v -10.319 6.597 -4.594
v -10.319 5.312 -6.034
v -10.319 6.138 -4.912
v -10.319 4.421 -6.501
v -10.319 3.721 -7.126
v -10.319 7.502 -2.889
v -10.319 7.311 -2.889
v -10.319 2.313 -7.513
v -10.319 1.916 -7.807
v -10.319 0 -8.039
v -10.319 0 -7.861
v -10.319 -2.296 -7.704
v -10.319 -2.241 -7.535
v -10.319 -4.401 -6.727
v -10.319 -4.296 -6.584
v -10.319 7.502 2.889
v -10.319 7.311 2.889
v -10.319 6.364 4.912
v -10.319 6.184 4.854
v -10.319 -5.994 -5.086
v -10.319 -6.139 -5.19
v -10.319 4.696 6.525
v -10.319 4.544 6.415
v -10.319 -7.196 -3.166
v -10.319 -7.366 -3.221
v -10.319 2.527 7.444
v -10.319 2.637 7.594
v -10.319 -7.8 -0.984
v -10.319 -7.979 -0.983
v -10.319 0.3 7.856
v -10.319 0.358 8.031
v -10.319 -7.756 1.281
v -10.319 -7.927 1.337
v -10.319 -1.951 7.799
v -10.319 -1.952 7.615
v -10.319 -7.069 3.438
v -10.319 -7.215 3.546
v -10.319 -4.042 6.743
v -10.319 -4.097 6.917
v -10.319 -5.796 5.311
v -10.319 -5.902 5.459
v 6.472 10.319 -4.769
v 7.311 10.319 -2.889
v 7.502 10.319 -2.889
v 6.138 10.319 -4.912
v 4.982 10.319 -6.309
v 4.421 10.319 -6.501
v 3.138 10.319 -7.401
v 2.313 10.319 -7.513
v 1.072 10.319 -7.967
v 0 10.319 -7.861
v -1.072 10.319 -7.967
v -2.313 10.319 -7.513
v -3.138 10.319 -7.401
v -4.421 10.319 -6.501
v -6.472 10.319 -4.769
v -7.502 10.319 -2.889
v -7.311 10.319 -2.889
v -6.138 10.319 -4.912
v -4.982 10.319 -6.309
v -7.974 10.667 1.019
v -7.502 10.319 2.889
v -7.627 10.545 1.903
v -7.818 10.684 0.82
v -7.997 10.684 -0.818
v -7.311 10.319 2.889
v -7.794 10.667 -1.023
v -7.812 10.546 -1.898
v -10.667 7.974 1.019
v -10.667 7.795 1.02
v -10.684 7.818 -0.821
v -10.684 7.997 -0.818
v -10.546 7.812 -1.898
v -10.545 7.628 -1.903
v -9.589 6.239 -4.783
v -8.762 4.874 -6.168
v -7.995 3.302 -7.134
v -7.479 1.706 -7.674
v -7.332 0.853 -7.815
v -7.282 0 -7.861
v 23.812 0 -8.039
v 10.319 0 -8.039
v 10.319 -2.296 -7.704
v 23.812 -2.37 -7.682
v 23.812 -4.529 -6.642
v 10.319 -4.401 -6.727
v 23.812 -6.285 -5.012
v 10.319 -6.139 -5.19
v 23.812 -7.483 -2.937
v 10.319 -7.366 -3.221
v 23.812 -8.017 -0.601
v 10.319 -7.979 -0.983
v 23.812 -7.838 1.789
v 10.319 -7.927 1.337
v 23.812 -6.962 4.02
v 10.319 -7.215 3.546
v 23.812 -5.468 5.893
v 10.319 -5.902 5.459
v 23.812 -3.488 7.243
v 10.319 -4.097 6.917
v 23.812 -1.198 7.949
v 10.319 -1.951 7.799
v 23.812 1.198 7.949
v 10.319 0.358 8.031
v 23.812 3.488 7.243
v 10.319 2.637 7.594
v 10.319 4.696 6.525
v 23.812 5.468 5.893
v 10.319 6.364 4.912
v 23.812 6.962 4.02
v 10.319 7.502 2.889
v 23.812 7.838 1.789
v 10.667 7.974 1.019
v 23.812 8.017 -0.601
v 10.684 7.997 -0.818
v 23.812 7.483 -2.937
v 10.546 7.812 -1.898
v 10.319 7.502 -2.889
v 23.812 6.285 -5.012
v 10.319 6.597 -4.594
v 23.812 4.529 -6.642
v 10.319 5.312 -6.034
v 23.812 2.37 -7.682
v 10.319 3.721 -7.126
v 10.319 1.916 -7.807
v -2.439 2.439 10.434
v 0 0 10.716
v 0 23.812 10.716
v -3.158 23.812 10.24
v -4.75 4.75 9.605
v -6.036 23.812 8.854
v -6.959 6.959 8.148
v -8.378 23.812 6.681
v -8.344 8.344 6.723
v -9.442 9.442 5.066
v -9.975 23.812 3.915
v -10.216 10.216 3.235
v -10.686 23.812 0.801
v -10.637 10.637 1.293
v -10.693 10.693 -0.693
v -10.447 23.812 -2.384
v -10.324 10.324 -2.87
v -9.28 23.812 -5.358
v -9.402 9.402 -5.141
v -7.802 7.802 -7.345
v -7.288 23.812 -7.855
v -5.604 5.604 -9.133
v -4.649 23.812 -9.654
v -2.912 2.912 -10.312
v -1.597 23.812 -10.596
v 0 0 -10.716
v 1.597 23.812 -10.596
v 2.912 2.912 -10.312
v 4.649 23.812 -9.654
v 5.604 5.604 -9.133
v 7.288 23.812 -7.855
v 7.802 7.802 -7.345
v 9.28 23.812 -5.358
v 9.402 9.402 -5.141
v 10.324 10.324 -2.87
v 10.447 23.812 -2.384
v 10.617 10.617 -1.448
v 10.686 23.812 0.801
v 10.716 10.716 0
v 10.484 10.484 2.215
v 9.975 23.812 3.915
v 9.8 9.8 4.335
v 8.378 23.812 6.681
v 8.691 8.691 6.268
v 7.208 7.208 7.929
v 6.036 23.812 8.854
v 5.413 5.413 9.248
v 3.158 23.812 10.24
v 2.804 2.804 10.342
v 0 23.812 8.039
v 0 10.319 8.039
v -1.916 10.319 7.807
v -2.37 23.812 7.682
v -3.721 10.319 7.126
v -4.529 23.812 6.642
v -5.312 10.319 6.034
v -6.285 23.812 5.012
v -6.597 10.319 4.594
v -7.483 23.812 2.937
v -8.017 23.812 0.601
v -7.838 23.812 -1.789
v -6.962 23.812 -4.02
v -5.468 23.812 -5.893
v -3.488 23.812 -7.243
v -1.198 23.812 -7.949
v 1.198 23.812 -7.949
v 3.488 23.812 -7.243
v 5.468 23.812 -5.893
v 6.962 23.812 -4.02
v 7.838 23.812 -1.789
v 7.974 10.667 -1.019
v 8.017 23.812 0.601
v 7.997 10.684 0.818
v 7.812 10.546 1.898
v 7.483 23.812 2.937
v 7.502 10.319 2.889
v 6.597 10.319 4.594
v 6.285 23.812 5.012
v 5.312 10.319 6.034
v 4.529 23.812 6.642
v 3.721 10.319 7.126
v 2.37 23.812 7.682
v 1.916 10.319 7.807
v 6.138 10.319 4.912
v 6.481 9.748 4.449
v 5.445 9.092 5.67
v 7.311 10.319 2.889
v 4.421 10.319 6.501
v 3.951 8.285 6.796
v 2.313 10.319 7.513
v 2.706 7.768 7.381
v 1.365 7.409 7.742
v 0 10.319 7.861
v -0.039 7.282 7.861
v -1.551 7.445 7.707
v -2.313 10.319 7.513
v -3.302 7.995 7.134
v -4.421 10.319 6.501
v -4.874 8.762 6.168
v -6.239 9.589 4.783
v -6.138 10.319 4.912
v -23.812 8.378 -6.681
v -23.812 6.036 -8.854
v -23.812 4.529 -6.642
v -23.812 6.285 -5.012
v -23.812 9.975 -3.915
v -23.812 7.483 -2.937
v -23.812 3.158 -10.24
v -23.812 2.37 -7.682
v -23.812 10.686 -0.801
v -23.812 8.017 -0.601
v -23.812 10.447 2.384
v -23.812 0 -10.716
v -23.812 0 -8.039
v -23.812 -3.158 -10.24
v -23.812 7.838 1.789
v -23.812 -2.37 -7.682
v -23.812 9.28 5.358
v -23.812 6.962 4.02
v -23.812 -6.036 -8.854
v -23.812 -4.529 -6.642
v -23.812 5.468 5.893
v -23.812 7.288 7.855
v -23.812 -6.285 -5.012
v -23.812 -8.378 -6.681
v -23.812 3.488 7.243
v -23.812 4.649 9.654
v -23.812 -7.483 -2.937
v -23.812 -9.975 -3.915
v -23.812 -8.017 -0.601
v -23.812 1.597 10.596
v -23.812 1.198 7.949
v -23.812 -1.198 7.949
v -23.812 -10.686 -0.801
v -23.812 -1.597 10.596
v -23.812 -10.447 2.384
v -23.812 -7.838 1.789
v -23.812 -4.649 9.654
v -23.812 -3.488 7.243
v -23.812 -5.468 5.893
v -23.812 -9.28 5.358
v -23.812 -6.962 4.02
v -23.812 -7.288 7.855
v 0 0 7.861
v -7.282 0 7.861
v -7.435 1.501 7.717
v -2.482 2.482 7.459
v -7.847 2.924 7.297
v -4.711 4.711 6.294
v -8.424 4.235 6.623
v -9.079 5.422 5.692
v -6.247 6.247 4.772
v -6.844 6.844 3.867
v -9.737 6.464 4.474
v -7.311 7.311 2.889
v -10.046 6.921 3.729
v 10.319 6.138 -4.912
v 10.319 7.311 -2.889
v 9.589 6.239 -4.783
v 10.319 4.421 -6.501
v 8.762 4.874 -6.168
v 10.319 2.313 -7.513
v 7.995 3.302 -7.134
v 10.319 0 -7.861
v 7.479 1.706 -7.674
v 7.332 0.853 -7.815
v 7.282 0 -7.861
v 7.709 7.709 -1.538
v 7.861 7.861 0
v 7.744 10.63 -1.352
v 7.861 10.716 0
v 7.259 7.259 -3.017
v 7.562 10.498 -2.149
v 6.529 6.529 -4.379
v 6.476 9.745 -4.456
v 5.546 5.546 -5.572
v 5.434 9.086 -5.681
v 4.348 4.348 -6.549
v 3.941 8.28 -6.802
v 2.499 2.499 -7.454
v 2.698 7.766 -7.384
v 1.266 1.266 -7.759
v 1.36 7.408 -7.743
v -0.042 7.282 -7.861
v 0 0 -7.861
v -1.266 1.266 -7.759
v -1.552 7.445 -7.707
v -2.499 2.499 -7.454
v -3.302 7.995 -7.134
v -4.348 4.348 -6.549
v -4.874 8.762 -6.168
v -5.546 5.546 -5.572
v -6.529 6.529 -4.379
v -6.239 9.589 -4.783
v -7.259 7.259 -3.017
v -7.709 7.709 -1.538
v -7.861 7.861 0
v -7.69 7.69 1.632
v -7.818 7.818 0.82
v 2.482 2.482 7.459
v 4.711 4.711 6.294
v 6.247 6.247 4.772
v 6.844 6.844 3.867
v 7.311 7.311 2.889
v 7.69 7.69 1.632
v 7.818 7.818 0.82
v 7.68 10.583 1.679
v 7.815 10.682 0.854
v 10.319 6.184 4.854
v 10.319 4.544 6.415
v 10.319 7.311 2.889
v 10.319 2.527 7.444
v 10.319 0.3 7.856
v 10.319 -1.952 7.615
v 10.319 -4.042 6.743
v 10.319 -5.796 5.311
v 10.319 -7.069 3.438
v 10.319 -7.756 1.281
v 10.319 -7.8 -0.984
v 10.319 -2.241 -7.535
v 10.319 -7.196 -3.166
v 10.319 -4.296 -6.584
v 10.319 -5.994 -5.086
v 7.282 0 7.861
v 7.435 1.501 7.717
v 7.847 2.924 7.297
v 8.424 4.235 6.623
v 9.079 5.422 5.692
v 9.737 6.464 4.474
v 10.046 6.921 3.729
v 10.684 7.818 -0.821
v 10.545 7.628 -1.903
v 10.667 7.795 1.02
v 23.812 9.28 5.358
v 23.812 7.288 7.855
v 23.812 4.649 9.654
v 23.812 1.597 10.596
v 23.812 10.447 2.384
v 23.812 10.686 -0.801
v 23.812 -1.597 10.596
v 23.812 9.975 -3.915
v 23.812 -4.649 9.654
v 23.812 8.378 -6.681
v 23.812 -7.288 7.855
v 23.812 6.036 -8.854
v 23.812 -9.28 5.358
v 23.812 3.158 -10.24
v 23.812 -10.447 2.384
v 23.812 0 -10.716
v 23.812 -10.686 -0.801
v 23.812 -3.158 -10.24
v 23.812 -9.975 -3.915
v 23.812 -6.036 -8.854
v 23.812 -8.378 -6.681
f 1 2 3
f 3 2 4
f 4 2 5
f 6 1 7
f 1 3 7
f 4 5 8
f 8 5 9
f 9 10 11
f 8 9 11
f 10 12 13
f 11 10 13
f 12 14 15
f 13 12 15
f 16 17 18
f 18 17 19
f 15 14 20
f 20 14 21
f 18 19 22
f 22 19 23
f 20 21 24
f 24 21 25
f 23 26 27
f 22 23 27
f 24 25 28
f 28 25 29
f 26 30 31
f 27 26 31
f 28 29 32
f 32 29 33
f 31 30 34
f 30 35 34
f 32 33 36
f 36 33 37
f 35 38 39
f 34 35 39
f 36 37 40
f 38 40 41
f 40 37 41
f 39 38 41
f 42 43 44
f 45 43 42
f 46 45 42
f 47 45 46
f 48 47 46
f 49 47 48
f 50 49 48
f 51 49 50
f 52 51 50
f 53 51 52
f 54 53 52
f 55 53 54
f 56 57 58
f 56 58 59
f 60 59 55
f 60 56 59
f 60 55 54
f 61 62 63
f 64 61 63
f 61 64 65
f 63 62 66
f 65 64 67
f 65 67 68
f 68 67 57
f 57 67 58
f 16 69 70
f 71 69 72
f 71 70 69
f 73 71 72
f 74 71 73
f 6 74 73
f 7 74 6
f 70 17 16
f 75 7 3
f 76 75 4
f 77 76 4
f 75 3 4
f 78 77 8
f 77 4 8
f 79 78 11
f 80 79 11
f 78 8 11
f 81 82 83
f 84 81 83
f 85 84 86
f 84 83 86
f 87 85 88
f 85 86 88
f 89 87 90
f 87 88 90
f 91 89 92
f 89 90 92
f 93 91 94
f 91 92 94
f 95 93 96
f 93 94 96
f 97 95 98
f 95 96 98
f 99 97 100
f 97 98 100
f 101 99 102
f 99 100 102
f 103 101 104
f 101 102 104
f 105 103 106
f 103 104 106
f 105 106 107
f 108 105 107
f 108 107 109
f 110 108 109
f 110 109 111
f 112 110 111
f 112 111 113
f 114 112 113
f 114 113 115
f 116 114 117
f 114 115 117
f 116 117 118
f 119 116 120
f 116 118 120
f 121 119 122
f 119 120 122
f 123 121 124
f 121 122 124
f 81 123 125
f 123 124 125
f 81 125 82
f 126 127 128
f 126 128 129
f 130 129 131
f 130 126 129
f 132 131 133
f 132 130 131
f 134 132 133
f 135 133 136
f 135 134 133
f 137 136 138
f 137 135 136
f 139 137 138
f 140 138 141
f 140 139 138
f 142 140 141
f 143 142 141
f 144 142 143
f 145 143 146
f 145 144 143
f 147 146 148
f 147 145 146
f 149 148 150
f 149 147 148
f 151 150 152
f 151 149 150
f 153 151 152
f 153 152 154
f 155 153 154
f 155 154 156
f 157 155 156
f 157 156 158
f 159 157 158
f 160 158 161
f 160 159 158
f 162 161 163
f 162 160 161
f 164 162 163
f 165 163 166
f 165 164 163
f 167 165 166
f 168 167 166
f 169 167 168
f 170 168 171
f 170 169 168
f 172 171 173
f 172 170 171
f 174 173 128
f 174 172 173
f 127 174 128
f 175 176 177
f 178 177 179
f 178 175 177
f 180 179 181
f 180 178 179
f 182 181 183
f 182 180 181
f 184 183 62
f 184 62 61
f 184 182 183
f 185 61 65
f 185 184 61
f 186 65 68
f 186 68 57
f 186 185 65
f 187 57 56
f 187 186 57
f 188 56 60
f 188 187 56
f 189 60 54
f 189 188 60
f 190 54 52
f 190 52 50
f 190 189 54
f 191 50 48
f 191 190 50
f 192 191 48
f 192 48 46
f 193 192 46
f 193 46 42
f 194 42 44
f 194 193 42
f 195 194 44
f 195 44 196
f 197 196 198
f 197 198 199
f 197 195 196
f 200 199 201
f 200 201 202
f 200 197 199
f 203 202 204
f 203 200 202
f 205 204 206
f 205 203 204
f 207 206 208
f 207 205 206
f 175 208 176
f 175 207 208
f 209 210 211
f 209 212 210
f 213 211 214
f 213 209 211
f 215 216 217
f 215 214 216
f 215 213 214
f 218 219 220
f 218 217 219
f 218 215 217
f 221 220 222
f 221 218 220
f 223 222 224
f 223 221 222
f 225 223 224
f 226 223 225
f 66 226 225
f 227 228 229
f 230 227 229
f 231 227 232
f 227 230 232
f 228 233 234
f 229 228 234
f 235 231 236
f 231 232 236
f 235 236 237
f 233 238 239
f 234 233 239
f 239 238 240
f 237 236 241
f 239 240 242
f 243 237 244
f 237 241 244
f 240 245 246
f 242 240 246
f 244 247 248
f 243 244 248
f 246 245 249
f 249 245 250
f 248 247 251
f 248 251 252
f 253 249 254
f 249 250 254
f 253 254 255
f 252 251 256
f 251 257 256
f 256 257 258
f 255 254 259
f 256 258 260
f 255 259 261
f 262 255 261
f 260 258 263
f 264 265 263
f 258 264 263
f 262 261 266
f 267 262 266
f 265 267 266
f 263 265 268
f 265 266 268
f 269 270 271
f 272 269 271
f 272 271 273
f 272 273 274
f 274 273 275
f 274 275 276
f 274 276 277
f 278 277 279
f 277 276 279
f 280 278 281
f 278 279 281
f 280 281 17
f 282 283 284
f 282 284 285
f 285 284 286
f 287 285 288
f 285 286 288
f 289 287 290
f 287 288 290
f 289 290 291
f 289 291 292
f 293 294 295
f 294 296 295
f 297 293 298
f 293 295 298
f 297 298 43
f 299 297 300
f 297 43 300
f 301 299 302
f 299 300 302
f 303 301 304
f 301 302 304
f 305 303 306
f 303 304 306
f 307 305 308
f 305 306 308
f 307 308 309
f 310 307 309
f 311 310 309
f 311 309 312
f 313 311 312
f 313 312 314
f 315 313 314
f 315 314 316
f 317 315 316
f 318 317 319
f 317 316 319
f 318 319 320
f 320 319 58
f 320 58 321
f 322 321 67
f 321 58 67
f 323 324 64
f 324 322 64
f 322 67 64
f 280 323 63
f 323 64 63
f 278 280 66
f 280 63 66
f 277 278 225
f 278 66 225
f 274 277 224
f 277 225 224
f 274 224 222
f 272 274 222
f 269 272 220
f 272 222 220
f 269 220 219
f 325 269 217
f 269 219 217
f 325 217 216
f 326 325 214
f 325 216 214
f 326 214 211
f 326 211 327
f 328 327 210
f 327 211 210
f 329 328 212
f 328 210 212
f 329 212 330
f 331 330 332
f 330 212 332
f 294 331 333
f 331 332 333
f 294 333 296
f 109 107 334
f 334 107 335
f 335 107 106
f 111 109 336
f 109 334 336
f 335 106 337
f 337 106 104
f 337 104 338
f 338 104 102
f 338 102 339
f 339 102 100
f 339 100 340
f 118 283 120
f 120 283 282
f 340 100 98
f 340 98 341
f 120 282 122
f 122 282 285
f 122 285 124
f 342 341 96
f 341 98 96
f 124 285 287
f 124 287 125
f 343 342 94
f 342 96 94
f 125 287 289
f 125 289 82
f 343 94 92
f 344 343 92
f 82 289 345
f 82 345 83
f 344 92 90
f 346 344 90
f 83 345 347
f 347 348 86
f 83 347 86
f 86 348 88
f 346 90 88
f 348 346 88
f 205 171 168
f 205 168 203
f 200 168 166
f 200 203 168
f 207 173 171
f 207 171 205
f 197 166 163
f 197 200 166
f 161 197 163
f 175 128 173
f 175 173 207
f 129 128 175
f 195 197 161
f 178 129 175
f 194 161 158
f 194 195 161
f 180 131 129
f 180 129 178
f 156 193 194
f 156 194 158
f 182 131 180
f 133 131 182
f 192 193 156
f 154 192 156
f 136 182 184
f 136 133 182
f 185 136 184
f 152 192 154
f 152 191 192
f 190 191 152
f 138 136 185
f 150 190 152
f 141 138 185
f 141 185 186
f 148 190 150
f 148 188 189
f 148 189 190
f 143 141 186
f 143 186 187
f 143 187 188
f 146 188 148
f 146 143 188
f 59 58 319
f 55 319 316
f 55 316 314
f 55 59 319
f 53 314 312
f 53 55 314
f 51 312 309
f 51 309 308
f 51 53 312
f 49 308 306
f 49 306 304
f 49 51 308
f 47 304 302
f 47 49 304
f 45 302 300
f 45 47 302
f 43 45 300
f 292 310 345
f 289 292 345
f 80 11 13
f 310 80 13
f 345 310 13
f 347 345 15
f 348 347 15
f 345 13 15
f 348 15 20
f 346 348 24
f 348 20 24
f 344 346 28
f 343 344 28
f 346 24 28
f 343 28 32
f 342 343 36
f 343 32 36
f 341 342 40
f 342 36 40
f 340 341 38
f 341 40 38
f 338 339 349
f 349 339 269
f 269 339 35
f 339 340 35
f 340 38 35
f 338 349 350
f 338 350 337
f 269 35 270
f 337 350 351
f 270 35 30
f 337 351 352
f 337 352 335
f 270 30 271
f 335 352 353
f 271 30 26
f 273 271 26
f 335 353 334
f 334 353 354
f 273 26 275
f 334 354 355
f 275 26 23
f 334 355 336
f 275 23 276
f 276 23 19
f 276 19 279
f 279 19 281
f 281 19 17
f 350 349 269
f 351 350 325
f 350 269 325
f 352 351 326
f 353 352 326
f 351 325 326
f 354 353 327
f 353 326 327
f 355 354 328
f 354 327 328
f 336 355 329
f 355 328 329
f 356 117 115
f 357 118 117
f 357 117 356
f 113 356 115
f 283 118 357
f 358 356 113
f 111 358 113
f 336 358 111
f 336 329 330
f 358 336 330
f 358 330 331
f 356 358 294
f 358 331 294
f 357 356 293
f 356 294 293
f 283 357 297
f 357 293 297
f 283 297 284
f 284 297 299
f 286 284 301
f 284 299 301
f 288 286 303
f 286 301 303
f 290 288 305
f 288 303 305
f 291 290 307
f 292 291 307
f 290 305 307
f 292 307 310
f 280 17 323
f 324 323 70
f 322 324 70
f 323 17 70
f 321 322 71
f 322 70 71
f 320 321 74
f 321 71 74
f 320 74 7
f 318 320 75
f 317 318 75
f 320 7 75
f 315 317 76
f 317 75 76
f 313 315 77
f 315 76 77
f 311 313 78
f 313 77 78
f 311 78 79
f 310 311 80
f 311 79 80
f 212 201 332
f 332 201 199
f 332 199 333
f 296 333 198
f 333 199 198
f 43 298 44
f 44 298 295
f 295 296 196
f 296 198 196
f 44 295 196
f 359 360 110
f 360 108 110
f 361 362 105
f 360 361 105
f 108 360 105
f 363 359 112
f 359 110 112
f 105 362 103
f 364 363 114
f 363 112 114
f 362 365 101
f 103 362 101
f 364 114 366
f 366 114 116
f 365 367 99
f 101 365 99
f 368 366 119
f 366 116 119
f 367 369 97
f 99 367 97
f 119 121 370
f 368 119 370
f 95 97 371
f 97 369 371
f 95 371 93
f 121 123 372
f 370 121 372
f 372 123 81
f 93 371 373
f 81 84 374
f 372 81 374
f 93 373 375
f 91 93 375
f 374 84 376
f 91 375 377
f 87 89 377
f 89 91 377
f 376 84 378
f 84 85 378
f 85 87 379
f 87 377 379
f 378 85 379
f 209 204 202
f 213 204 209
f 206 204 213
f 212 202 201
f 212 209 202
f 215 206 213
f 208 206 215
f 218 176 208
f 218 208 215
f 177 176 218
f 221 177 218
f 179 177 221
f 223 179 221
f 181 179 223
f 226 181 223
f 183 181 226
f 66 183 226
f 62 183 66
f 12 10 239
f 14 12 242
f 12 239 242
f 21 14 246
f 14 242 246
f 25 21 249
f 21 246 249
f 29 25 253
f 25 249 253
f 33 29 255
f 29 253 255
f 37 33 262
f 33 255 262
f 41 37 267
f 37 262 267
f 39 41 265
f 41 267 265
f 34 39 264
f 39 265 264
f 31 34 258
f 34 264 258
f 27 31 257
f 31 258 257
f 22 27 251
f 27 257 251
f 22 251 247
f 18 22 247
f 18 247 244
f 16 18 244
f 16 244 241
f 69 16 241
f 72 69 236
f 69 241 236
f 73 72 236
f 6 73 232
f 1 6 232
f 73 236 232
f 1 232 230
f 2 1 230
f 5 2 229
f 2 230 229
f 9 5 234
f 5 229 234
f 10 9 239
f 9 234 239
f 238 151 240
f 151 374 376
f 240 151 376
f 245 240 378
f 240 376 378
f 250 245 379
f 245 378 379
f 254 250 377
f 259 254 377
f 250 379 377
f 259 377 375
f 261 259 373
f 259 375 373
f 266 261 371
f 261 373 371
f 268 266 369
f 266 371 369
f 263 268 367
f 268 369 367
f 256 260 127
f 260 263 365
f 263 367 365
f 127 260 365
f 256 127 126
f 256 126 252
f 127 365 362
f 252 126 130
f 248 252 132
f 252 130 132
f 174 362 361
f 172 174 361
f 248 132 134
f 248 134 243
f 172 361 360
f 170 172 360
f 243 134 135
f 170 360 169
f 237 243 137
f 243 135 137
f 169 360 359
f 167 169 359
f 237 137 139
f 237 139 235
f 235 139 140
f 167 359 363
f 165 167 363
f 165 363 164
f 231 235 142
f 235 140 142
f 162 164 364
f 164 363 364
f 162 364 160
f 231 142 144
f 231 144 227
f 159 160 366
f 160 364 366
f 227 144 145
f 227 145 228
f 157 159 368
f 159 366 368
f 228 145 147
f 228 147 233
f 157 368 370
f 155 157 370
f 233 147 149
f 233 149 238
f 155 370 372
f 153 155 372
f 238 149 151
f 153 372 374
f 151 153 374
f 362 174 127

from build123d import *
from build123d.topology import SkipClean

# Parameters (mm, degrees)
SKETCH4_R              = 7.8613
CUT_EXTRUDE1_DEPTH     = 50.165
CUT_EXTRUDE2_OUTLINE_W = 7.8613
CUT_EXTRUDE2_OUTLINE_H = 10.71591219


# Read off the part's stored shape, not the designer's step: Cut-Extrude2
with BuildPart() as part:
    # Sketch1 → Revolve1 (revolve)
    with BuildSketch(Plane.XY, mode=Mode.PRIVATE) as revolve1_sk:
        Polygon((-23.8125, 10.715625), (23.8125, 10.715625), (23.8125, 8.0391), (10.31875, 8.0391), (10.31875, 7.8613), (-10.31875, 7.8613), (-10.31875, 8.0391), (-23.8125, 8.0391), align=None)
    revolve(revolve1_sk.sketch.rotate(Axis((38.116724739, 0, 0), (-1, 0, 0)), 90), axis=Axis((38.116724739, 0, 0), (-1, 0, 0)))

    # Sketch3 → Revolve2 (revolve)
    with BuildSketch(Plane.XY, mode=Mode.PRIVATE) as revolve2_sk:
        Polygon((8.0391, 23.8125), (10.715625, 23.8125), (10.715625, 0), (7.8613, 0), (7.8613, 10.31875), (8.0391, 10.31875), align=None)
    revolve(revolve2_sk.sketch.rotate(Axis((0, 32.756669959, 0), (0, -1, 0)), 90), axis=Axis((0, 32.756669959, 0), (0, -1, 0)))

    # Sketch4 → Cut-Extrude1 (cut)
    with BuildSketch(Plane.ZY.offset(26.3525)):
        with Locations(Location((0, 0, 0), (0, 0, 68.436398303))):
            Circle(SKETCH4_R)
    extrude(amount=-CUT_EXTRUDE1_DEPTH, mode=Mode.SUBTRACT)

    # Cut-Extrude2 outline → Cut-Extrude2 (revolve, cut)
    with SkipClean():  # the faces are left unmerged after this step: merging them gives an invalid solid
        with BuildSketch(Plane.XY):
            with Locations((3.93065, 5.357956095)):
                Rectangle(CUT_EXTRUDE2_OUTLINE_W, CUT_EXTRUDE2_OUTLINE_H)
        revolve(axis=Axis((0, 0, 0), (0, 1, 0)), mode=Mode.SUBTRACT)


solid = part.part
